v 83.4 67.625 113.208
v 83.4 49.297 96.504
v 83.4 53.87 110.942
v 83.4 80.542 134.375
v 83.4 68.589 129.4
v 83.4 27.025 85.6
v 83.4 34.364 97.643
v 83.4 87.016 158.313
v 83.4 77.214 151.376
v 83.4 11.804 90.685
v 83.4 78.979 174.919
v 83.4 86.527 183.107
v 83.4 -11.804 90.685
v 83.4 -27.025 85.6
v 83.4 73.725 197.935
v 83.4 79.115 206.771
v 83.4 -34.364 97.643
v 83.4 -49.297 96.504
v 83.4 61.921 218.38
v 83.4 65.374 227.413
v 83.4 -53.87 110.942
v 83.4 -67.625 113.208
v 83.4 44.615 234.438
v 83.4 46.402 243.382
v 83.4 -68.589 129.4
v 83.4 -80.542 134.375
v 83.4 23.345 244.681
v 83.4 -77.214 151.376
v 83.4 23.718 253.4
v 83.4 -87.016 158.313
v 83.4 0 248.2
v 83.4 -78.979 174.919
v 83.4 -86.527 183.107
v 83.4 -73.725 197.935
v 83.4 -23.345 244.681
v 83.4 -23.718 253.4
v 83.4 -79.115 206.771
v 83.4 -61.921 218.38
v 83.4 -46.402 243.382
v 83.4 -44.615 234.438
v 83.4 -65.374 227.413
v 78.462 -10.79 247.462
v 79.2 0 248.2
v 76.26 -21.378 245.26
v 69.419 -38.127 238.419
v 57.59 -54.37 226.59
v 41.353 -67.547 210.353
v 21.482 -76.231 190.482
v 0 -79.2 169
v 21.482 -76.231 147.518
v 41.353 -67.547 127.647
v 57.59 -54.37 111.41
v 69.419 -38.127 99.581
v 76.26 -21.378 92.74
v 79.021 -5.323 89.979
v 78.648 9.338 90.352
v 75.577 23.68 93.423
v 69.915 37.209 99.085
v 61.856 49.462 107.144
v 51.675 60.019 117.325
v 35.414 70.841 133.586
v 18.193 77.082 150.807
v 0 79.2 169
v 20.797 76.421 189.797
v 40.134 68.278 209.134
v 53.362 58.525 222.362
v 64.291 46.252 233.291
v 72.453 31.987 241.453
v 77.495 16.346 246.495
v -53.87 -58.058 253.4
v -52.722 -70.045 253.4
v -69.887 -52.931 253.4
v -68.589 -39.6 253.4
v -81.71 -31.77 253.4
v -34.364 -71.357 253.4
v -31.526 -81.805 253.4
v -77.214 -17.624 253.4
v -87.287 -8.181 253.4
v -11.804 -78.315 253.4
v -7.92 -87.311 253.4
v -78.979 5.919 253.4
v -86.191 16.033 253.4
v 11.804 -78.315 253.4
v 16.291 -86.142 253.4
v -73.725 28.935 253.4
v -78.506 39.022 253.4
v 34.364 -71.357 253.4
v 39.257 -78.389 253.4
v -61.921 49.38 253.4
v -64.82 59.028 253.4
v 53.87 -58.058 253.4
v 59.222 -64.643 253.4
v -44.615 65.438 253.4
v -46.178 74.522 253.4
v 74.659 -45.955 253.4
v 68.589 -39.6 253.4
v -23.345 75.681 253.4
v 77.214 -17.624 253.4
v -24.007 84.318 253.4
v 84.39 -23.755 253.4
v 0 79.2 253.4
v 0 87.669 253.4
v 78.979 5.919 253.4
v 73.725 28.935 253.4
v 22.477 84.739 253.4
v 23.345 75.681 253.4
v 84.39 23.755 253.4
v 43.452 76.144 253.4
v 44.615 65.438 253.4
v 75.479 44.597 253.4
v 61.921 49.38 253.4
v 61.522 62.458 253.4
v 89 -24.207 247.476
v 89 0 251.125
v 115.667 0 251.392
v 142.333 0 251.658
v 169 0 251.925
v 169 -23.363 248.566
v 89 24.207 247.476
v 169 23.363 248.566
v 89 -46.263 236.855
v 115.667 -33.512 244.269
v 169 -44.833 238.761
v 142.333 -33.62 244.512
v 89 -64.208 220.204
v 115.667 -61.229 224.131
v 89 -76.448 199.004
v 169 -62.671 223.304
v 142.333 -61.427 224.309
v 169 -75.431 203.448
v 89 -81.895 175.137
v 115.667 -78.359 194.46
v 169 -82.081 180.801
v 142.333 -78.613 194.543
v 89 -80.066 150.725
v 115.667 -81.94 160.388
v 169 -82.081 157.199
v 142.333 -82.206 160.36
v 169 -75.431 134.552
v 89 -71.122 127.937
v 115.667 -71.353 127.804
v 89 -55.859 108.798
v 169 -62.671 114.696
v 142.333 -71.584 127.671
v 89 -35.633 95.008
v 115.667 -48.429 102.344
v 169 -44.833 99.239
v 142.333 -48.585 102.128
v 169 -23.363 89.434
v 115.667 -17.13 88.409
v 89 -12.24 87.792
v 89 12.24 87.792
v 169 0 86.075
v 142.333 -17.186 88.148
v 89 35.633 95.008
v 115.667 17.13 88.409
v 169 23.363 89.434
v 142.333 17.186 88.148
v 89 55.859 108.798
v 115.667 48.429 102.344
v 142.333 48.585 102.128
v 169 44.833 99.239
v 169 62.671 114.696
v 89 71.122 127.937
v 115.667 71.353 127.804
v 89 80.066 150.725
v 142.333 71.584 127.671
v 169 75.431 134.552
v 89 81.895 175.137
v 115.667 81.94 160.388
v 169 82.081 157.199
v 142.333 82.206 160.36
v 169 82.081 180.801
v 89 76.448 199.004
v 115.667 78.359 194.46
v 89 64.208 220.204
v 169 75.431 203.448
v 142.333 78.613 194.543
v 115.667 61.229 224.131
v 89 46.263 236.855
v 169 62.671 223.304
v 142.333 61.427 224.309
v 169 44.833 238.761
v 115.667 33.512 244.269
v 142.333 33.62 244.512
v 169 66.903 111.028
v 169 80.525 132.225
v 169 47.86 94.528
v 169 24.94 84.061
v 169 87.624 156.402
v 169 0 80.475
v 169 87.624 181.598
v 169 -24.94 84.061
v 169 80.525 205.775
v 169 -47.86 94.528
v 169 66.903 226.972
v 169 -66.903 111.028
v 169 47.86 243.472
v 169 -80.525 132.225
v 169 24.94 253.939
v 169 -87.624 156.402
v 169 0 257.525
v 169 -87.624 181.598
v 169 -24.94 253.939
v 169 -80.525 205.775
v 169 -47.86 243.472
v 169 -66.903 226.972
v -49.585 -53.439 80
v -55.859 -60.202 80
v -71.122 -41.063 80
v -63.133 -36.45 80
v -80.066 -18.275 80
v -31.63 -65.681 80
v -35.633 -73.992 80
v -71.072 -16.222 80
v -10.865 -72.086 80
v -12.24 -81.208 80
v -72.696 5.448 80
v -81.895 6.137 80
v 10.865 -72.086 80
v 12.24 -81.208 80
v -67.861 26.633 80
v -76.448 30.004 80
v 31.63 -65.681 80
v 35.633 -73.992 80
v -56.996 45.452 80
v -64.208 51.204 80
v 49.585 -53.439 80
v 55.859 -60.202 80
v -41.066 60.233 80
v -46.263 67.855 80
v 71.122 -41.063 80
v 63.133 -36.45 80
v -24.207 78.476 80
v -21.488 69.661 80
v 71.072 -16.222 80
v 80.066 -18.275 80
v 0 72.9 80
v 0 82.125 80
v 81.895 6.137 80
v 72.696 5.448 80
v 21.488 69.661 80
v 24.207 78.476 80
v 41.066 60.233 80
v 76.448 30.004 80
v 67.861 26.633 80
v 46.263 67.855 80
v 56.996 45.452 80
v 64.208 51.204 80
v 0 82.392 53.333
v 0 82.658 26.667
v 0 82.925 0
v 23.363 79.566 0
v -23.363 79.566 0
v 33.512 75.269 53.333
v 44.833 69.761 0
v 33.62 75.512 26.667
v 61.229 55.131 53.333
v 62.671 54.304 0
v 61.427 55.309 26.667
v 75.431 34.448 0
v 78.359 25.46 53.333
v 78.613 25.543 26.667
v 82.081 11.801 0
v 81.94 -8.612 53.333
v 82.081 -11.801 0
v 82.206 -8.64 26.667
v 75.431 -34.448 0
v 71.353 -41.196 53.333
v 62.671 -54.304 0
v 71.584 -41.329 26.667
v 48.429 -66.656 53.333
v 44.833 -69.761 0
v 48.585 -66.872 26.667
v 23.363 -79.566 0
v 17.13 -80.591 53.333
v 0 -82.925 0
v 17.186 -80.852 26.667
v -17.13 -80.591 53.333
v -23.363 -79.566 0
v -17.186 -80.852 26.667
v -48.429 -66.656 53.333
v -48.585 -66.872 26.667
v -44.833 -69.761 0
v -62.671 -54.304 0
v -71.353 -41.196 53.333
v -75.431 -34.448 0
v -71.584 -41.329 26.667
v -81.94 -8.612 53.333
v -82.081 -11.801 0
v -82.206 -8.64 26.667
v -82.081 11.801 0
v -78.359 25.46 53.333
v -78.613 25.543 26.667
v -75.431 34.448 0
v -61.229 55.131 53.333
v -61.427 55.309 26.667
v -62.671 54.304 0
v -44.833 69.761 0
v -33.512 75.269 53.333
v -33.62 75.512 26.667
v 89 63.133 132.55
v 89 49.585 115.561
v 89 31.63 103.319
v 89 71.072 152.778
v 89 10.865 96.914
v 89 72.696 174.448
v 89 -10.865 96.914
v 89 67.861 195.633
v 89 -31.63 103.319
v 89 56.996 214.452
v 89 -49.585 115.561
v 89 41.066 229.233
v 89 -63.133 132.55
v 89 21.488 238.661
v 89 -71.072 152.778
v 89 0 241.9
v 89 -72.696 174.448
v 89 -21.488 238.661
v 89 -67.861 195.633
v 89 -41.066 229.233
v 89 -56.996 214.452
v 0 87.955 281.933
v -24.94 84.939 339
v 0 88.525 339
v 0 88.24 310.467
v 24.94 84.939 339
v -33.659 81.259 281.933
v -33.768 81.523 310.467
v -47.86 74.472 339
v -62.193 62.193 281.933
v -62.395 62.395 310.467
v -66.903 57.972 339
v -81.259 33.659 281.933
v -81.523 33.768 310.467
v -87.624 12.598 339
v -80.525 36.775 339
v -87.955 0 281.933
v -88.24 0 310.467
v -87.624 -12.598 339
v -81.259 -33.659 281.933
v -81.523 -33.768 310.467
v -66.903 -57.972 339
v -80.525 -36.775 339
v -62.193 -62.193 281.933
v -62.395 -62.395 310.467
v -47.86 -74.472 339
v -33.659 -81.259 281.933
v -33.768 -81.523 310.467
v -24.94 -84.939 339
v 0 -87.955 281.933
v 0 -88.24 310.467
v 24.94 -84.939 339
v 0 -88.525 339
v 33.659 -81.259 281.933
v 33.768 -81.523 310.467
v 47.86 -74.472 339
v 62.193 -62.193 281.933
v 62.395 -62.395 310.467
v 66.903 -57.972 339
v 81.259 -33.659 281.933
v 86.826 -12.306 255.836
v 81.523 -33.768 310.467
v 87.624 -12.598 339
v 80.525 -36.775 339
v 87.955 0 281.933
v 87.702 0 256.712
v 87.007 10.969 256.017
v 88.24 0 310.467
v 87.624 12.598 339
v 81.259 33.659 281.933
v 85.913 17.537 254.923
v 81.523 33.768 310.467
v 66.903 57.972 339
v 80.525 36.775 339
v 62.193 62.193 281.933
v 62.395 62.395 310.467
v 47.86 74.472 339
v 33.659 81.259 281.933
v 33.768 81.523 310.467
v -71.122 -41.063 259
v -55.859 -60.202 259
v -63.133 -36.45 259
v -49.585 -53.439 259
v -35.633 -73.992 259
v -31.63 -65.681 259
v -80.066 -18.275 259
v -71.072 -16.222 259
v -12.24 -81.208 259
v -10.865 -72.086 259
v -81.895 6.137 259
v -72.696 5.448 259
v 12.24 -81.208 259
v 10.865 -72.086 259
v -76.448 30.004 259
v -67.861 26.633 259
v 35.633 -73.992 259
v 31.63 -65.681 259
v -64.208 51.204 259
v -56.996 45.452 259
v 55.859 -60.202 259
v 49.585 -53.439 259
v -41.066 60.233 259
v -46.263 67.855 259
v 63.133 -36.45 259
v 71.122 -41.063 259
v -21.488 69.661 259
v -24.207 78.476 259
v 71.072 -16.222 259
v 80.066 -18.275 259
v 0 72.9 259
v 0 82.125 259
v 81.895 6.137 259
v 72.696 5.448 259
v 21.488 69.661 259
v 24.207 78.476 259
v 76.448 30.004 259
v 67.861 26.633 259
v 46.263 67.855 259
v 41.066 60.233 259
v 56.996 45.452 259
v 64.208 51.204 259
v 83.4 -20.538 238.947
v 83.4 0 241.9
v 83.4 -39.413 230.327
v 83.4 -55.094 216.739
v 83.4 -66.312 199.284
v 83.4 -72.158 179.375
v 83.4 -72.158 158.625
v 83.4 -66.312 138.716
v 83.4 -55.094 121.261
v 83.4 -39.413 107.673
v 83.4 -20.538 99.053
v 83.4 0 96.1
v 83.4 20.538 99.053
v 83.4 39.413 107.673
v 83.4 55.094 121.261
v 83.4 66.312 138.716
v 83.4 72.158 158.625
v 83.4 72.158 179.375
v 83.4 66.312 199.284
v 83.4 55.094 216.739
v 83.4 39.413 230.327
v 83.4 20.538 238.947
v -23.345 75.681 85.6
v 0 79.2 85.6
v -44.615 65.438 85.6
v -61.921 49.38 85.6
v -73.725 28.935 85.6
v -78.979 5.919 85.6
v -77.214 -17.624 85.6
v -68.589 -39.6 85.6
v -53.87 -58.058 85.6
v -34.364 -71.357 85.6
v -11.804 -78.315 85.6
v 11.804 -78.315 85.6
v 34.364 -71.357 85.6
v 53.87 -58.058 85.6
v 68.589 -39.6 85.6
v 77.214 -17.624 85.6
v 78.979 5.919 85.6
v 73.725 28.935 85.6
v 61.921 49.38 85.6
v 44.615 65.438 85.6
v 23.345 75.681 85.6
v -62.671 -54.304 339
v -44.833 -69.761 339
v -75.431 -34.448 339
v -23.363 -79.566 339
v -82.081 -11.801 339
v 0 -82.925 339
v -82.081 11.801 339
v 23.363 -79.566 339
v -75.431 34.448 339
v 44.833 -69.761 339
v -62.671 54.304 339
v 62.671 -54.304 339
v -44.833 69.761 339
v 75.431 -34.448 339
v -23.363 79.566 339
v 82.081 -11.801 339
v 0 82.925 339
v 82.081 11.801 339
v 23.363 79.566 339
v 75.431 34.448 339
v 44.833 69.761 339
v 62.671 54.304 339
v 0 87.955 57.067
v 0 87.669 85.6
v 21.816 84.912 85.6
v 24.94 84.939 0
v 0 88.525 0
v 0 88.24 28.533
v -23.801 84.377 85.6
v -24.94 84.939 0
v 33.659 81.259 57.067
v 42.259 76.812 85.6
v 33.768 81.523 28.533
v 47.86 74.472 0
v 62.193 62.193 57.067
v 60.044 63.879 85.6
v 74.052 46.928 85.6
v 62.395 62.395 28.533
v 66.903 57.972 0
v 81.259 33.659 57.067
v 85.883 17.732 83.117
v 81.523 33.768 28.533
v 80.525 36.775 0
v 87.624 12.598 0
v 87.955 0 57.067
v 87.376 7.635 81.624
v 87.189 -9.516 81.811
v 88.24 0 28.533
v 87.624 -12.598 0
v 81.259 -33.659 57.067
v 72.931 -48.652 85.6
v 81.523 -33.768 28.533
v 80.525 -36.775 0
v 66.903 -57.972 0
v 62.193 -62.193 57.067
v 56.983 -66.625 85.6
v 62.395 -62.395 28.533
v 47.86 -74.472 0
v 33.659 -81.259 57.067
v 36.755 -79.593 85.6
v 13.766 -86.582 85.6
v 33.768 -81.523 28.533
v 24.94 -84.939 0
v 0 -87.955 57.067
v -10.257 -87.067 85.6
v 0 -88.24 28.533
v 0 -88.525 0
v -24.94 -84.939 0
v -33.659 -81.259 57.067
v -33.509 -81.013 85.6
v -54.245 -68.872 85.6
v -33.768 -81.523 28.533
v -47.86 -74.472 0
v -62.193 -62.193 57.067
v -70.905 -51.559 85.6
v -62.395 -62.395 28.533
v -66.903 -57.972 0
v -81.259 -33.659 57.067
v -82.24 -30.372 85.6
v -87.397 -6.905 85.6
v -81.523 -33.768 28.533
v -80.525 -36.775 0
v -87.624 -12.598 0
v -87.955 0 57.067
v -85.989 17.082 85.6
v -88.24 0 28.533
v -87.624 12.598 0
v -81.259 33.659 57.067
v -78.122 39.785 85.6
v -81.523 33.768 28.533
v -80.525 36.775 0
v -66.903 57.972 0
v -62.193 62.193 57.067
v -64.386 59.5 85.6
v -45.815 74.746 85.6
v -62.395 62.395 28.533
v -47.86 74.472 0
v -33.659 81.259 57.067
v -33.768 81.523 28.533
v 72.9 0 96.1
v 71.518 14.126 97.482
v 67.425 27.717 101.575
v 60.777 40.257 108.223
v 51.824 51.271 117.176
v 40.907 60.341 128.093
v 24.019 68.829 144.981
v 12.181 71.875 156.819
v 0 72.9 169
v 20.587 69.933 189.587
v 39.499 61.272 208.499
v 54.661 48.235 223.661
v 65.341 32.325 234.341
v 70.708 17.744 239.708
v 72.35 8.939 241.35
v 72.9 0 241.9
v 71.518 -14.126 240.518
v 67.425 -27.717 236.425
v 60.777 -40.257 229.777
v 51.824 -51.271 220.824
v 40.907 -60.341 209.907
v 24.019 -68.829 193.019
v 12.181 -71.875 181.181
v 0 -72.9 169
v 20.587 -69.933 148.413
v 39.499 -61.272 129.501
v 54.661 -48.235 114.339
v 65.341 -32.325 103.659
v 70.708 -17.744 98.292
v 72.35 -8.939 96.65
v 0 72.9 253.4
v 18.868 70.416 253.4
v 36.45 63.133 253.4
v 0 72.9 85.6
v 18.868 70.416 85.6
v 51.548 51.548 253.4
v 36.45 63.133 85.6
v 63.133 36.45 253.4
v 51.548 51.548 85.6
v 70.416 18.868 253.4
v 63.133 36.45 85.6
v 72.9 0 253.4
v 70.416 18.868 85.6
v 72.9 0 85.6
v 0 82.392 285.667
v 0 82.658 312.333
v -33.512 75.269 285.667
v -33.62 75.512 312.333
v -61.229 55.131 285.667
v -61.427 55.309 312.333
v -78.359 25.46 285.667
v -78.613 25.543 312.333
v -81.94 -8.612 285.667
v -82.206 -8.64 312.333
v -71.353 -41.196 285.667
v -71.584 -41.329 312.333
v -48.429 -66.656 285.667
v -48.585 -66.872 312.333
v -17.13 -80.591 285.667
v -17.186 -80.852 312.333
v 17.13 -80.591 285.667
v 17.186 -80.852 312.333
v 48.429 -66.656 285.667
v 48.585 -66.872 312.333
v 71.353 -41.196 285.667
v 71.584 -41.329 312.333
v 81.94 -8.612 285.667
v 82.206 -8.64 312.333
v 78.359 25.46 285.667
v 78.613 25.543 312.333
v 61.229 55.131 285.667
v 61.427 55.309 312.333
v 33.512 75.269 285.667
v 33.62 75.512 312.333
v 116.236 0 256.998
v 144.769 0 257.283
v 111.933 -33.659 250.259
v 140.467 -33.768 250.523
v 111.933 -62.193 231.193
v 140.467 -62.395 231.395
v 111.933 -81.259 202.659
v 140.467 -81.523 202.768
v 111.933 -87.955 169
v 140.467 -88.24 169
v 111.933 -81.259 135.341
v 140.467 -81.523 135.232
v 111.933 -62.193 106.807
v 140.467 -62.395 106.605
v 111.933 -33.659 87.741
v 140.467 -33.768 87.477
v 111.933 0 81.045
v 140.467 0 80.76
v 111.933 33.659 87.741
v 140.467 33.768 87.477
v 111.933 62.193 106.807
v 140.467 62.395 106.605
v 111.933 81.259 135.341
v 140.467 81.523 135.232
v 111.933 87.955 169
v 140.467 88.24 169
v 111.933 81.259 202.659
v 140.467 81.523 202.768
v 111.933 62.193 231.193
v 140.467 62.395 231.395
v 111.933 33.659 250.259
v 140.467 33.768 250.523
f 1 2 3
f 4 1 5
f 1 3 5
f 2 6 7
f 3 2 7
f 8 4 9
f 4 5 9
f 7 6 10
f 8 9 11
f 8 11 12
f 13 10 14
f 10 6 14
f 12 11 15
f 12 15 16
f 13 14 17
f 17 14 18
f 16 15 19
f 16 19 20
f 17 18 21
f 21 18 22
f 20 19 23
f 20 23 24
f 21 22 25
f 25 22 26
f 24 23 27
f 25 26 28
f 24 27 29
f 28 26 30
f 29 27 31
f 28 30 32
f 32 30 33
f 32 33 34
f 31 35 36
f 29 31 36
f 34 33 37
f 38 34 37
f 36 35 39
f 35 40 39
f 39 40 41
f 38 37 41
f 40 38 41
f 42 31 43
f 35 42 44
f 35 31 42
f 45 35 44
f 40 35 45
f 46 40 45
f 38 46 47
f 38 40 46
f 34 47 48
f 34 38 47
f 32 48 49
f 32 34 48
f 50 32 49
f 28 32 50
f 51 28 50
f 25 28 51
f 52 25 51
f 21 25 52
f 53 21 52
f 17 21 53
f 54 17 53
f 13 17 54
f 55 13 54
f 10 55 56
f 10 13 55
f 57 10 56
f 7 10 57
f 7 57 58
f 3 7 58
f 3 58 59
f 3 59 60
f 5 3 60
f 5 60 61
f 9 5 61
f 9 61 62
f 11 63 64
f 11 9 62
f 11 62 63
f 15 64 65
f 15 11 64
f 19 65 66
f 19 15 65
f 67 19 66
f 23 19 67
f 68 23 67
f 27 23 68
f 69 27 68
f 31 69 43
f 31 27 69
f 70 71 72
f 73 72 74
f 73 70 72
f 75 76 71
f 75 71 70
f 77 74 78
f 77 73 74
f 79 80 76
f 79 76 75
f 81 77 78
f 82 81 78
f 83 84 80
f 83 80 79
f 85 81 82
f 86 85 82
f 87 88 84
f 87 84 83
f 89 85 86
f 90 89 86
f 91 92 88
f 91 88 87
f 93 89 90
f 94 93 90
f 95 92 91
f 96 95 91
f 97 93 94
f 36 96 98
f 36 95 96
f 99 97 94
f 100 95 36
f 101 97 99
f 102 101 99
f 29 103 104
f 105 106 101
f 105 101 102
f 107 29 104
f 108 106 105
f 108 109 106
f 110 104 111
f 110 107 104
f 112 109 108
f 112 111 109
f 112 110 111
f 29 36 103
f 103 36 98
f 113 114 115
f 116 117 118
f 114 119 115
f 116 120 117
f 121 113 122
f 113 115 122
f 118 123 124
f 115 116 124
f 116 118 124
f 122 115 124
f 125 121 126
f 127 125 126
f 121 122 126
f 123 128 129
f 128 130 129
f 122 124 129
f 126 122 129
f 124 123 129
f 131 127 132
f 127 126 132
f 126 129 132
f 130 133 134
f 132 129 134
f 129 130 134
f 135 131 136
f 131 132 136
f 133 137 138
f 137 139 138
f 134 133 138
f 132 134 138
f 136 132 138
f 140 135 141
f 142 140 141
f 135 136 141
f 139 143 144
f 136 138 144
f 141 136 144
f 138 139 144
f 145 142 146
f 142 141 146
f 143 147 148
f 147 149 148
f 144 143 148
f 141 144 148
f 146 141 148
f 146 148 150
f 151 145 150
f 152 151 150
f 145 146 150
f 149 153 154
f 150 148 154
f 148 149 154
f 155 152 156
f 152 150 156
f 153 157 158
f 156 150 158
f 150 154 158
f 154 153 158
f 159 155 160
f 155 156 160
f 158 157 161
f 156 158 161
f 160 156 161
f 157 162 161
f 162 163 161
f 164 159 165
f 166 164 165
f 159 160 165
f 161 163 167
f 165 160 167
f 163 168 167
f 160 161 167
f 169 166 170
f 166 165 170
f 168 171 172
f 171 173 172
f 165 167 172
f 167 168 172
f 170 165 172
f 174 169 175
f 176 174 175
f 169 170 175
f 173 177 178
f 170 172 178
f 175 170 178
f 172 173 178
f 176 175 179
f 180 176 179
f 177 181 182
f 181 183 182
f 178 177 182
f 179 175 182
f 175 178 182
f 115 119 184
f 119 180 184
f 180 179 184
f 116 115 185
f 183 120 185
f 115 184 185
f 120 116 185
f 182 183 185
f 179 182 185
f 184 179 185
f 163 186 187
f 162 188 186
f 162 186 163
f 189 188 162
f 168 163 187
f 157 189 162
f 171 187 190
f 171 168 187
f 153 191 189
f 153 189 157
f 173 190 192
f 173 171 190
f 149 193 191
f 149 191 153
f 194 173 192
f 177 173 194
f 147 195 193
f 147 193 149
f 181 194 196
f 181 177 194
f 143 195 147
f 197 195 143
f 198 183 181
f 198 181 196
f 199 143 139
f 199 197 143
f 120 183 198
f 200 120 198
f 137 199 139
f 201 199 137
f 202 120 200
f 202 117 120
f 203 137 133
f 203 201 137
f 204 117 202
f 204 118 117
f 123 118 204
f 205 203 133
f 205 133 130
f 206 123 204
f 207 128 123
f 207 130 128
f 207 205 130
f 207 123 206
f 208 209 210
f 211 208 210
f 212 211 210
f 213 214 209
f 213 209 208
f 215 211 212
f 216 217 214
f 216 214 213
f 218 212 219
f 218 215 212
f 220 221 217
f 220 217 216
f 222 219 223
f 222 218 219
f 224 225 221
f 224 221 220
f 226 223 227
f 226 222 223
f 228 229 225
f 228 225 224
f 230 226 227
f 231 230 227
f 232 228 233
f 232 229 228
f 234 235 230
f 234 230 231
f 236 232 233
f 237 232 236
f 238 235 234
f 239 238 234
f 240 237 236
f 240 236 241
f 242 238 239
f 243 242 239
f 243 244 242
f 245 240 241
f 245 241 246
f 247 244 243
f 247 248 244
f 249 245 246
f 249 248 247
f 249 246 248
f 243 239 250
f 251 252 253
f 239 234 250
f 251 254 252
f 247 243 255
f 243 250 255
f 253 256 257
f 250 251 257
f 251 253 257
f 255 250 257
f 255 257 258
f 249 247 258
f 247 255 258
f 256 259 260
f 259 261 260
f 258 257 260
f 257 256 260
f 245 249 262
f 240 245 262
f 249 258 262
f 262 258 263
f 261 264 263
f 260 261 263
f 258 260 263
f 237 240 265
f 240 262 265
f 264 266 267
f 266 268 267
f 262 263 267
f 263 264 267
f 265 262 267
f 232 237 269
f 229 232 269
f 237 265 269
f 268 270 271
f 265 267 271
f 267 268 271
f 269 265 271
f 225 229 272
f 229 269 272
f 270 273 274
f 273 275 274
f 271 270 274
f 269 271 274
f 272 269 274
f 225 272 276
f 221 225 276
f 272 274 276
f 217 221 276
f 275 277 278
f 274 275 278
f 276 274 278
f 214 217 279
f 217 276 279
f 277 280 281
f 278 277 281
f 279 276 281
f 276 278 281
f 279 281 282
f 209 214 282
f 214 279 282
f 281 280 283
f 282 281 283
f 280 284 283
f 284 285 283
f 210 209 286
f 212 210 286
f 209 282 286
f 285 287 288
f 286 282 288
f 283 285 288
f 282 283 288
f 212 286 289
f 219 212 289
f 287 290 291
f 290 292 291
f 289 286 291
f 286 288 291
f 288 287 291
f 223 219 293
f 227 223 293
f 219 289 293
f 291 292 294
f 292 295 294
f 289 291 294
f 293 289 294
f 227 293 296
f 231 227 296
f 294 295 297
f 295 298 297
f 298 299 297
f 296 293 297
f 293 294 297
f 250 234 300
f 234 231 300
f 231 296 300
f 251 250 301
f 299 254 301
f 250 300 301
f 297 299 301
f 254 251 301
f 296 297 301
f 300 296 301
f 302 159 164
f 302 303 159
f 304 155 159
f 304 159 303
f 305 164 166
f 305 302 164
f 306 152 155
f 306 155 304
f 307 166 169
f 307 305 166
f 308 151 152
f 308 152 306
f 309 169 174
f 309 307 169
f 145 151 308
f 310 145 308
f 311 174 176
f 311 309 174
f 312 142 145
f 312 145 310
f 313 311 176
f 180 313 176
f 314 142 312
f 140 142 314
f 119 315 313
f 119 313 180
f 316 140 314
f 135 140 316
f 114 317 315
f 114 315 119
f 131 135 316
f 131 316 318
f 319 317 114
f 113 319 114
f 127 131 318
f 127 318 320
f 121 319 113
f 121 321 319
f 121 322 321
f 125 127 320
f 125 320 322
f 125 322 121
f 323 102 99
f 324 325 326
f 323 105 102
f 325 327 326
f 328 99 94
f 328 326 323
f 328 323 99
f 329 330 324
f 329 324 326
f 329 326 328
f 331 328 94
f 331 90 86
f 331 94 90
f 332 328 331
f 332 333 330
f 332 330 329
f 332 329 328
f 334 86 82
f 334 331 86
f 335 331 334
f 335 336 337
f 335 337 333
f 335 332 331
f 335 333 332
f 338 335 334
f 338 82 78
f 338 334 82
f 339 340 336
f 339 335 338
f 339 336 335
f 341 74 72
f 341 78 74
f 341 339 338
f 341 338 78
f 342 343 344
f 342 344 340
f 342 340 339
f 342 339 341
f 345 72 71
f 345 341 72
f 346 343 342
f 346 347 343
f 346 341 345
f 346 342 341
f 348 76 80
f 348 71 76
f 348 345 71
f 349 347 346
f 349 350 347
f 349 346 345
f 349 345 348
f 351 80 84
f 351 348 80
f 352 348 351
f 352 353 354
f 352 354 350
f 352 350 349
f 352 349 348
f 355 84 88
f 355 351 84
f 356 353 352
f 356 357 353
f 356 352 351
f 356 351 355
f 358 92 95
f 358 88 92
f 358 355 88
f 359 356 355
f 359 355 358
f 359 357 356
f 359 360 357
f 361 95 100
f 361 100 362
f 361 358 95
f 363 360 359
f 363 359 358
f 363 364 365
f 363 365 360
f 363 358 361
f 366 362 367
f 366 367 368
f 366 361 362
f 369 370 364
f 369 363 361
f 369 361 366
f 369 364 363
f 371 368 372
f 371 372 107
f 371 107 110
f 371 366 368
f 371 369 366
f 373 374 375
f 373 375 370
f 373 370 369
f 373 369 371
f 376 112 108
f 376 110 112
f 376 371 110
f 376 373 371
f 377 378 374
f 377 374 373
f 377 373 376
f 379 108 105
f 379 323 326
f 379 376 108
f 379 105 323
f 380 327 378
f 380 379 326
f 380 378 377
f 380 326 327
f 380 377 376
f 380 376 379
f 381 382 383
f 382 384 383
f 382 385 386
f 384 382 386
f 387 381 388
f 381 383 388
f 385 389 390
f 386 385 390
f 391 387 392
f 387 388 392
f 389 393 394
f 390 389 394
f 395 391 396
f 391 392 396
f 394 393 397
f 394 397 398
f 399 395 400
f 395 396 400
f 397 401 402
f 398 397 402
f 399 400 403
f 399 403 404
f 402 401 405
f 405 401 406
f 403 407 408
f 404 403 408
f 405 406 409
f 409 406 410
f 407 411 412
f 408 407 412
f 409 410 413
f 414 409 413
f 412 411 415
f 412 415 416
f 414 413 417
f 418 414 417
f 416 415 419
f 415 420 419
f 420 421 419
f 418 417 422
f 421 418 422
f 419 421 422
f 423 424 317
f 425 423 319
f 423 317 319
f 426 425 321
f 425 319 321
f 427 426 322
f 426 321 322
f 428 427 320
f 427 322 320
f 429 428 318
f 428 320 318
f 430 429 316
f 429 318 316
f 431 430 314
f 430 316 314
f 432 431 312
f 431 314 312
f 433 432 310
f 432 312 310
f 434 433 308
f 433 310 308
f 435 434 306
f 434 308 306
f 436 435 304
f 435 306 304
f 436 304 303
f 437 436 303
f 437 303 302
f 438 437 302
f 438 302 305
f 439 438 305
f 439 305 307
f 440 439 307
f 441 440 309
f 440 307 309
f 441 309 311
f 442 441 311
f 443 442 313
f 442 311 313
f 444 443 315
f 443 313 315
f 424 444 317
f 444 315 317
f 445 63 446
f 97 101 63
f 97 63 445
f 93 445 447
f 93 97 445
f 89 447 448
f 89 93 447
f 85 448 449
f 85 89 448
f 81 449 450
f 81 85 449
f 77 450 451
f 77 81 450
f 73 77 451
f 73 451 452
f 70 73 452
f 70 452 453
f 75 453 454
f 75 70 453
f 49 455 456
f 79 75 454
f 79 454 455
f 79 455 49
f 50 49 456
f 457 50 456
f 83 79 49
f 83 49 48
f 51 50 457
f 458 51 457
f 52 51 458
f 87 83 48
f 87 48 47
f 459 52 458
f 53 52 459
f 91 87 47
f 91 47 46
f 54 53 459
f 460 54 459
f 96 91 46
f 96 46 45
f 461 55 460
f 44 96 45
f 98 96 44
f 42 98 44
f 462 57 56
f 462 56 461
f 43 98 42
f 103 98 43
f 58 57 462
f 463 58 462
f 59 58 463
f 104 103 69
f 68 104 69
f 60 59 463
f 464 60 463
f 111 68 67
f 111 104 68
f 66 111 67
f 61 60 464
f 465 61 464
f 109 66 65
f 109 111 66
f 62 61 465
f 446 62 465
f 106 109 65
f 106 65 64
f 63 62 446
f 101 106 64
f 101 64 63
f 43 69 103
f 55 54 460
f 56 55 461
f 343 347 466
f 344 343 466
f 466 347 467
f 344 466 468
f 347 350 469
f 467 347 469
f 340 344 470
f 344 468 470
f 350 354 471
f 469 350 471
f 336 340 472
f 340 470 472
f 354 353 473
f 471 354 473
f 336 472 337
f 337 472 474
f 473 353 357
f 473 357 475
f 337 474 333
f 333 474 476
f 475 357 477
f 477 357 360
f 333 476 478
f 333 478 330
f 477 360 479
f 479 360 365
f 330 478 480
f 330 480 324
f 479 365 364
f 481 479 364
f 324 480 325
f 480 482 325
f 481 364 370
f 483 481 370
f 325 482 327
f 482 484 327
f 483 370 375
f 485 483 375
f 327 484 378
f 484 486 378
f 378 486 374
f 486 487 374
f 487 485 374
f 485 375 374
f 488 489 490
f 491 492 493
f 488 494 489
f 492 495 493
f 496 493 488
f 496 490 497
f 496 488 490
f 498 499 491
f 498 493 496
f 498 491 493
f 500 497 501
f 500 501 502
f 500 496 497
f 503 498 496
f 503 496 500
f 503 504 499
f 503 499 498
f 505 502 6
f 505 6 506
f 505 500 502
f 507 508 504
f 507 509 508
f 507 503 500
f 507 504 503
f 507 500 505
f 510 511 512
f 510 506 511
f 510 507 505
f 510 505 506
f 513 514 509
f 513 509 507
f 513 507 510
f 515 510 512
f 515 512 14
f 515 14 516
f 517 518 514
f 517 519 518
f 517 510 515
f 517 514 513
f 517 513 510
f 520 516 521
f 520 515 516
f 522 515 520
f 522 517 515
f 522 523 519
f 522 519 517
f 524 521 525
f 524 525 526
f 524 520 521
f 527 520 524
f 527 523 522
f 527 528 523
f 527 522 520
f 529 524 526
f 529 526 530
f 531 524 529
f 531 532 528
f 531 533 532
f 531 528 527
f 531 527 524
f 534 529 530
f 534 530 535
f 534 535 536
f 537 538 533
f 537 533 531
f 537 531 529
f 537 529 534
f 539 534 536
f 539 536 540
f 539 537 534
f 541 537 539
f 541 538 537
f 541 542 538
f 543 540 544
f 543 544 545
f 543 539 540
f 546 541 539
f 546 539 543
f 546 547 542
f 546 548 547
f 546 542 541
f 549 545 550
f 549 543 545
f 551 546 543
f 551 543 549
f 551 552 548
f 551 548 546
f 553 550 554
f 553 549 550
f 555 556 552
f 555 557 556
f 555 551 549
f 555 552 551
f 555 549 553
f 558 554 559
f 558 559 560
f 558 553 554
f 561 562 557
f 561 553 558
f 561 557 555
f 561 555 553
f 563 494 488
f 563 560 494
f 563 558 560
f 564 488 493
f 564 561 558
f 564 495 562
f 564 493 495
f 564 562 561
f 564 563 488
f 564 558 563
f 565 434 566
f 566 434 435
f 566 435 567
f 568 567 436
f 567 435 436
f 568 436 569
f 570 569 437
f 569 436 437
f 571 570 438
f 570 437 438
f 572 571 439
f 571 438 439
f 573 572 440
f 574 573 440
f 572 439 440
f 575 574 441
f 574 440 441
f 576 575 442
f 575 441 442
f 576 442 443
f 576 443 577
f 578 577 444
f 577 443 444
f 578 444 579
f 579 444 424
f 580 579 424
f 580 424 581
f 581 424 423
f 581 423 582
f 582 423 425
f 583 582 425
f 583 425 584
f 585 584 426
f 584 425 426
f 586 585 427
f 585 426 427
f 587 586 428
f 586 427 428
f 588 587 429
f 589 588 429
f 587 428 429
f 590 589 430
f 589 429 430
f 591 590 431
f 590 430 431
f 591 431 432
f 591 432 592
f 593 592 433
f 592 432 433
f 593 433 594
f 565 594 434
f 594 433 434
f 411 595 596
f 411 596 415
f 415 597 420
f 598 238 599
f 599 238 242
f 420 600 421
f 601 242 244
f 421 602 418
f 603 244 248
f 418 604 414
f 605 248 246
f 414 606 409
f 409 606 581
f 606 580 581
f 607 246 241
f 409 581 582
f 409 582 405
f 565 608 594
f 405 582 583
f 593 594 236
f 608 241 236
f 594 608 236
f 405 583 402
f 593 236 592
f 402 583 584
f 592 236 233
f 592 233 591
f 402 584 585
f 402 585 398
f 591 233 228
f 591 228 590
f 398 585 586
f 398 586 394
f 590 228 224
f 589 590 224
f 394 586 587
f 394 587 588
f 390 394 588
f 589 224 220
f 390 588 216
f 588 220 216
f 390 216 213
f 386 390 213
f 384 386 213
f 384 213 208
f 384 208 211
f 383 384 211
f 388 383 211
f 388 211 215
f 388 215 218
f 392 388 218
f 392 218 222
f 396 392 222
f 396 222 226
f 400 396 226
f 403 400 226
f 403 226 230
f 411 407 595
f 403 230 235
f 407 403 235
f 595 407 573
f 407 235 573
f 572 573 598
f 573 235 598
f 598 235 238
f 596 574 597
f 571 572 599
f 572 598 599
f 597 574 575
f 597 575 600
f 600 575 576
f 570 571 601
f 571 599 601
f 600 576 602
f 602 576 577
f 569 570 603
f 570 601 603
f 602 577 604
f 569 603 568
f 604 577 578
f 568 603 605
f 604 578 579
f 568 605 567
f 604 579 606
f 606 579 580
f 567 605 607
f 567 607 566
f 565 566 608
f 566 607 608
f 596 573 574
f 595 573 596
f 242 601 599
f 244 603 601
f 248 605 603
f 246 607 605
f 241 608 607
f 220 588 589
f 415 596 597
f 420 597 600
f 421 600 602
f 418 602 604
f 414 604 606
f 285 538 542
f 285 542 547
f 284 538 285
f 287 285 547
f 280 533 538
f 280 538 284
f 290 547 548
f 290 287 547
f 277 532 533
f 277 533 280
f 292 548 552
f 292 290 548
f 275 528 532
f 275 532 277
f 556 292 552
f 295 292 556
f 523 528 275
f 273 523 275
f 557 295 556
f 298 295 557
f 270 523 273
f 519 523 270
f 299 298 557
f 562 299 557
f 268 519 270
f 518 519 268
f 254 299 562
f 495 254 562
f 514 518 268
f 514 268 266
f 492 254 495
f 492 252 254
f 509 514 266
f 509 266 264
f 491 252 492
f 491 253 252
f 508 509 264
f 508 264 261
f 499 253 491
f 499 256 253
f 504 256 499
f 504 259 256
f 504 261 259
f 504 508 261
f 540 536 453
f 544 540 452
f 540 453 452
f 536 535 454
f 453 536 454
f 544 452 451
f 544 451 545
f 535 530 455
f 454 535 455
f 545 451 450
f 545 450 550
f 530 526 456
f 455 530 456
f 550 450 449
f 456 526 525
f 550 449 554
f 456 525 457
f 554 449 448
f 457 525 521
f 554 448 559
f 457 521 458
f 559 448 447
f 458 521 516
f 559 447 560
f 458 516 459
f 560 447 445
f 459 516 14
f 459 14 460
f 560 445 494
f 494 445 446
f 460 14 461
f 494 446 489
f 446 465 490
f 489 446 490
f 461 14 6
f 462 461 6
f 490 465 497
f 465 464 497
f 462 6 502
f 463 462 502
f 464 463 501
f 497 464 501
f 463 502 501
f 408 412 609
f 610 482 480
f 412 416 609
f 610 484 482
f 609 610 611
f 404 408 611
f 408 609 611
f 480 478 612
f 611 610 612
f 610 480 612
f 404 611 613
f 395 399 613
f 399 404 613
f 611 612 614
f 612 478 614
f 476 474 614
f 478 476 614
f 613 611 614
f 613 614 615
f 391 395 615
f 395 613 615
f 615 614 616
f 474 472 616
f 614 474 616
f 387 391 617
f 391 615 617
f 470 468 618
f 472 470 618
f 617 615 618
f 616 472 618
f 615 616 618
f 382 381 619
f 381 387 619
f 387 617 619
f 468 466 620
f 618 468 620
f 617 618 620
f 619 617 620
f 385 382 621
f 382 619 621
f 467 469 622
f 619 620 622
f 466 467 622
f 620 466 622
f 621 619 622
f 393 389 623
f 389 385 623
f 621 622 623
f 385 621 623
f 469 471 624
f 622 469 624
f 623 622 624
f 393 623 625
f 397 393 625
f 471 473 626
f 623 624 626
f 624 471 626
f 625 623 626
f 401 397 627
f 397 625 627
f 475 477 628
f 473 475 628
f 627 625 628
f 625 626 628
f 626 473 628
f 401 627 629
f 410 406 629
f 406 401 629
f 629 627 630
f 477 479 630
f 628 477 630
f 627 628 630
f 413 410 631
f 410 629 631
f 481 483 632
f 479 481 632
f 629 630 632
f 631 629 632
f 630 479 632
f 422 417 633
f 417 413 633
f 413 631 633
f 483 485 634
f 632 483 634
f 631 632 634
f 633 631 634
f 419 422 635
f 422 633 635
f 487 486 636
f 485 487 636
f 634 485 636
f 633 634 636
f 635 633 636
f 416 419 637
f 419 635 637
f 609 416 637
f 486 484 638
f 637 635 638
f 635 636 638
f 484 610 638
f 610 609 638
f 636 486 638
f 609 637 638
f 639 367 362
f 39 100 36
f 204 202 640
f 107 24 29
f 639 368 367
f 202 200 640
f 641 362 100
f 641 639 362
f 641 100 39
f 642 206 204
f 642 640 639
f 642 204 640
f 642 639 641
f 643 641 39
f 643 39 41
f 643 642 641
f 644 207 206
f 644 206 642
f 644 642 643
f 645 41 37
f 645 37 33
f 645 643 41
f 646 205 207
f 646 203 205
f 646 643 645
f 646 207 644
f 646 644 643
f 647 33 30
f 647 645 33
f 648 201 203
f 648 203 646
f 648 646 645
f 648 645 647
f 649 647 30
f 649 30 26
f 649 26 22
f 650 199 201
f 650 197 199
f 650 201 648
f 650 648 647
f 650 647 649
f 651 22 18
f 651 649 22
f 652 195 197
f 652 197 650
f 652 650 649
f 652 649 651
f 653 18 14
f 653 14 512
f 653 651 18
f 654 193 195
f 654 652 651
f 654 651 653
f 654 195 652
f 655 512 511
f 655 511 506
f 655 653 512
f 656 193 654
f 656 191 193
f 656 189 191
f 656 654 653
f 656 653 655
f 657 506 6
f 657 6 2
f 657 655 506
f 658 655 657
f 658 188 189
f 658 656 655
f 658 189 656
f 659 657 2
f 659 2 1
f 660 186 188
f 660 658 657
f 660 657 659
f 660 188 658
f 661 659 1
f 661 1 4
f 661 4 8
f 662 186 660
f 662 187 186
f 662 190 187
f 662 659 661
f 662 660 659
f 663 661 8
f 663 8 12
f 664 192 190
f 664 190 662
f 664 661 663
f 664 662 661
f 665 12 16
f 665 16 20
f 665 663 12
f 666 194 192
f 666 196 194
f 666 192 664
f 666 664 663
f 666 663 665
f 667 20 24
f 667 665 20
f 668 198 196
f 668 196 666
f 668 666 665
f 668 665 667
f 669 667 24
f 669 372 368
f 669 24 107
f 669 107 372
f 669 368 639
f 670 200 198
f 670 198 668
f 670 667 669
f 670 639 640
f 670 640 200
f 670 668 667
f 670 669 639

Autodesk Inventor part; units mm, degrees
ref_plane "YZ Plane" through (0, 0, 0) normal (1, 0, 0) x (0, 1, 0)
ref_plane "XZ Plane" through (0, 0, 0) normal (0, 1, 0) x (-1, 0, 0)
ref_plane "XY Plane" through (0, 0, 0) normal (0, 0, 1) x (1, 0, 0)
sketch "Sketch1" plane through (0, 0, 0) normal (1, 0, 0) x (0, 1, 0)
  line L0 (0, 0) -> (88.5253, 0)
  line L1 (88.5253, 0) -> (87.6693, 85.6)
  line L2 (82.125, 80) -> (72.9, 80)
  line L3 (0, 85.6) -> (0, 0)
  line L4 (82.125, 80) -> (82.925, 0)
  line L5 (0, 85.6) -> (87.6693, 85.6)
  line L6 (72.9, 85.6) -> (72.9, 80)
  line L7 (72.9, 253.4) -> (72.9, 85.6)
  line L8 (79.2, 85.6) -> (79.2, 253.4)
  line L9 (0, 253.4) -> (0, 85.6)
  line L10 (0, 169.5) -> (79.2, 169.5) construction
  line L11 (0, 339) -> (88.5253, 339)
  line L12 (88.5253, 339) -> (87.6693, 253.4)
  line L13 (82.125, 259) -> (72.9, 259)
  line L14 (0, 253.4) -> (0, 339)
  line L15 (82.125, 259) -> (82.925, 339)
  line L16 (0, 253.4) -> (87.6693, 253.4)
  line L17 (72.9, 253.4) -> (72.9, 259)
  dimension "d0" = 165.85
  dimension "d3" = 164.25
  dimension "d4" = 145.8
  dimension "d5" = 80
  dimension "d6" = 5.6
  dimension "d7" = 5.6
  dimension "d8" = 158.4
  dimension "d20" = 339
revolve "Revolution1" add sketch "Sketch1" angle 360 about axis through (0, 0, 85.6) along (0, 0, -1) contours L4 L2 L6 L5 L1 L0 | L9 L16 L7 L5 | L7 L16 L8 L5 | L17 L13 L15 L11 L12 L16
sketch "Sketch2" plane through (0, 0, 0) normal (0, 1, 0) x (-1, 0, 0)
  line L0 (-82.925, 0) -> (82.925, 0) projected
  line L1 (0, 0) -> (0, 339)
  line L2 (0, 169) -> (-169, 169)
  line L3 (-89, 241.9) -> (-89, 251.125)
  line L4 (-83.4, 256.6693) -> (-169, 257.5253)
  line L5 (-169, 257.5253) -> (-169, 169)
  line L6 (-89, 251.125) -> (-169, 251.925)
  line L7 (-83.4, 256.6693) -> (-83.4, 169)
  line L8 (-83.4, 241.9) -> (-89, 241.9)
  line L9 (0, 248.2) -> (-83.4, 248.2)
  line L10 (-82.925, 339) -> (82.925, 339) projected
  dimension "d9" = 165.85
  dimension "d10" = 164.25
  dimension "d11" = 145.8
  dimension "d12" = 5.6
  dimension "d13" = 80
  dimension "d14" = 5.6
  dimension "d15" = 158.4
  dimension "d16" = 169
  dimension "d17" = 169
revolve "Revolution2" add sketch "Sketch2" angle 360 about axis through (0, 0, 169) along (1, 0, 0) contours L2 L7 L9 L1 | L7 L8 L3 L6 L5 L4
sketch "Sketch3" plane through (0, 0, 253.4) normal (0, 0, 1) x (1, 0, 0)
  circle A0 centre (0, 0) radius 72.9 projected
  circle A1 centre (0, 0) radius 72.9
extrude "Extrusion1" cut sketch "Sketch3" against normal through all
sketch "Sketch4" plane through (83.4, 0, 169) normal (1, 0, 0) x (0, 0, -1)
  circle A0 centre (0, 0) radius 72.9 projected
  circle A1 centre (0, 0) radius 72.9
  circle A2 centre (0, 0) radius 72.9 projected
extrude "Extrusion2" cut sketch "Sketch4" against normal up to surface
equation "\"d9\" = d1"
equation "\"d10\" = d2"
equation "\"d11\" = d"
equation "\"d12\" = t2"
equation "\"d13\" = l1"
equation "\"d14\" = t2"
equation "\"d15\" = d + 2 * t1"
equation "\"d16\" = L3"
equation "\"d17\" = L1"
equation "\"d0\" = d1"
equation "\"d3\" = d2"
equation "\"d4\" = d"
equation "\"d5\" = l1"
equation "\"d6\" = t2"
equation "\"d7\" = t2"
equation "\"d8\" = d + 2 * t1"
equation "\"d20\" = L1 + L2"
equation "\"d\" = 145.8"
equation "\"d1\" = 165.85"
equation "\"d2\" = 164.25"
equation "\"l1\" = 80"
equation "\"L1\" = 169"
equation "\"L2\" = 170"
equation "\"L3\" = 169"
equation "\"t1\" = 6.3"
equation "\"t2\" = 5.6"
equation "\"Z1\" = 89"
equation "\"Z3\" = 89"
properties part number "JIS K 6739 90 Deg Lateral (DT) 150" material "PVC, Unplasticized"
